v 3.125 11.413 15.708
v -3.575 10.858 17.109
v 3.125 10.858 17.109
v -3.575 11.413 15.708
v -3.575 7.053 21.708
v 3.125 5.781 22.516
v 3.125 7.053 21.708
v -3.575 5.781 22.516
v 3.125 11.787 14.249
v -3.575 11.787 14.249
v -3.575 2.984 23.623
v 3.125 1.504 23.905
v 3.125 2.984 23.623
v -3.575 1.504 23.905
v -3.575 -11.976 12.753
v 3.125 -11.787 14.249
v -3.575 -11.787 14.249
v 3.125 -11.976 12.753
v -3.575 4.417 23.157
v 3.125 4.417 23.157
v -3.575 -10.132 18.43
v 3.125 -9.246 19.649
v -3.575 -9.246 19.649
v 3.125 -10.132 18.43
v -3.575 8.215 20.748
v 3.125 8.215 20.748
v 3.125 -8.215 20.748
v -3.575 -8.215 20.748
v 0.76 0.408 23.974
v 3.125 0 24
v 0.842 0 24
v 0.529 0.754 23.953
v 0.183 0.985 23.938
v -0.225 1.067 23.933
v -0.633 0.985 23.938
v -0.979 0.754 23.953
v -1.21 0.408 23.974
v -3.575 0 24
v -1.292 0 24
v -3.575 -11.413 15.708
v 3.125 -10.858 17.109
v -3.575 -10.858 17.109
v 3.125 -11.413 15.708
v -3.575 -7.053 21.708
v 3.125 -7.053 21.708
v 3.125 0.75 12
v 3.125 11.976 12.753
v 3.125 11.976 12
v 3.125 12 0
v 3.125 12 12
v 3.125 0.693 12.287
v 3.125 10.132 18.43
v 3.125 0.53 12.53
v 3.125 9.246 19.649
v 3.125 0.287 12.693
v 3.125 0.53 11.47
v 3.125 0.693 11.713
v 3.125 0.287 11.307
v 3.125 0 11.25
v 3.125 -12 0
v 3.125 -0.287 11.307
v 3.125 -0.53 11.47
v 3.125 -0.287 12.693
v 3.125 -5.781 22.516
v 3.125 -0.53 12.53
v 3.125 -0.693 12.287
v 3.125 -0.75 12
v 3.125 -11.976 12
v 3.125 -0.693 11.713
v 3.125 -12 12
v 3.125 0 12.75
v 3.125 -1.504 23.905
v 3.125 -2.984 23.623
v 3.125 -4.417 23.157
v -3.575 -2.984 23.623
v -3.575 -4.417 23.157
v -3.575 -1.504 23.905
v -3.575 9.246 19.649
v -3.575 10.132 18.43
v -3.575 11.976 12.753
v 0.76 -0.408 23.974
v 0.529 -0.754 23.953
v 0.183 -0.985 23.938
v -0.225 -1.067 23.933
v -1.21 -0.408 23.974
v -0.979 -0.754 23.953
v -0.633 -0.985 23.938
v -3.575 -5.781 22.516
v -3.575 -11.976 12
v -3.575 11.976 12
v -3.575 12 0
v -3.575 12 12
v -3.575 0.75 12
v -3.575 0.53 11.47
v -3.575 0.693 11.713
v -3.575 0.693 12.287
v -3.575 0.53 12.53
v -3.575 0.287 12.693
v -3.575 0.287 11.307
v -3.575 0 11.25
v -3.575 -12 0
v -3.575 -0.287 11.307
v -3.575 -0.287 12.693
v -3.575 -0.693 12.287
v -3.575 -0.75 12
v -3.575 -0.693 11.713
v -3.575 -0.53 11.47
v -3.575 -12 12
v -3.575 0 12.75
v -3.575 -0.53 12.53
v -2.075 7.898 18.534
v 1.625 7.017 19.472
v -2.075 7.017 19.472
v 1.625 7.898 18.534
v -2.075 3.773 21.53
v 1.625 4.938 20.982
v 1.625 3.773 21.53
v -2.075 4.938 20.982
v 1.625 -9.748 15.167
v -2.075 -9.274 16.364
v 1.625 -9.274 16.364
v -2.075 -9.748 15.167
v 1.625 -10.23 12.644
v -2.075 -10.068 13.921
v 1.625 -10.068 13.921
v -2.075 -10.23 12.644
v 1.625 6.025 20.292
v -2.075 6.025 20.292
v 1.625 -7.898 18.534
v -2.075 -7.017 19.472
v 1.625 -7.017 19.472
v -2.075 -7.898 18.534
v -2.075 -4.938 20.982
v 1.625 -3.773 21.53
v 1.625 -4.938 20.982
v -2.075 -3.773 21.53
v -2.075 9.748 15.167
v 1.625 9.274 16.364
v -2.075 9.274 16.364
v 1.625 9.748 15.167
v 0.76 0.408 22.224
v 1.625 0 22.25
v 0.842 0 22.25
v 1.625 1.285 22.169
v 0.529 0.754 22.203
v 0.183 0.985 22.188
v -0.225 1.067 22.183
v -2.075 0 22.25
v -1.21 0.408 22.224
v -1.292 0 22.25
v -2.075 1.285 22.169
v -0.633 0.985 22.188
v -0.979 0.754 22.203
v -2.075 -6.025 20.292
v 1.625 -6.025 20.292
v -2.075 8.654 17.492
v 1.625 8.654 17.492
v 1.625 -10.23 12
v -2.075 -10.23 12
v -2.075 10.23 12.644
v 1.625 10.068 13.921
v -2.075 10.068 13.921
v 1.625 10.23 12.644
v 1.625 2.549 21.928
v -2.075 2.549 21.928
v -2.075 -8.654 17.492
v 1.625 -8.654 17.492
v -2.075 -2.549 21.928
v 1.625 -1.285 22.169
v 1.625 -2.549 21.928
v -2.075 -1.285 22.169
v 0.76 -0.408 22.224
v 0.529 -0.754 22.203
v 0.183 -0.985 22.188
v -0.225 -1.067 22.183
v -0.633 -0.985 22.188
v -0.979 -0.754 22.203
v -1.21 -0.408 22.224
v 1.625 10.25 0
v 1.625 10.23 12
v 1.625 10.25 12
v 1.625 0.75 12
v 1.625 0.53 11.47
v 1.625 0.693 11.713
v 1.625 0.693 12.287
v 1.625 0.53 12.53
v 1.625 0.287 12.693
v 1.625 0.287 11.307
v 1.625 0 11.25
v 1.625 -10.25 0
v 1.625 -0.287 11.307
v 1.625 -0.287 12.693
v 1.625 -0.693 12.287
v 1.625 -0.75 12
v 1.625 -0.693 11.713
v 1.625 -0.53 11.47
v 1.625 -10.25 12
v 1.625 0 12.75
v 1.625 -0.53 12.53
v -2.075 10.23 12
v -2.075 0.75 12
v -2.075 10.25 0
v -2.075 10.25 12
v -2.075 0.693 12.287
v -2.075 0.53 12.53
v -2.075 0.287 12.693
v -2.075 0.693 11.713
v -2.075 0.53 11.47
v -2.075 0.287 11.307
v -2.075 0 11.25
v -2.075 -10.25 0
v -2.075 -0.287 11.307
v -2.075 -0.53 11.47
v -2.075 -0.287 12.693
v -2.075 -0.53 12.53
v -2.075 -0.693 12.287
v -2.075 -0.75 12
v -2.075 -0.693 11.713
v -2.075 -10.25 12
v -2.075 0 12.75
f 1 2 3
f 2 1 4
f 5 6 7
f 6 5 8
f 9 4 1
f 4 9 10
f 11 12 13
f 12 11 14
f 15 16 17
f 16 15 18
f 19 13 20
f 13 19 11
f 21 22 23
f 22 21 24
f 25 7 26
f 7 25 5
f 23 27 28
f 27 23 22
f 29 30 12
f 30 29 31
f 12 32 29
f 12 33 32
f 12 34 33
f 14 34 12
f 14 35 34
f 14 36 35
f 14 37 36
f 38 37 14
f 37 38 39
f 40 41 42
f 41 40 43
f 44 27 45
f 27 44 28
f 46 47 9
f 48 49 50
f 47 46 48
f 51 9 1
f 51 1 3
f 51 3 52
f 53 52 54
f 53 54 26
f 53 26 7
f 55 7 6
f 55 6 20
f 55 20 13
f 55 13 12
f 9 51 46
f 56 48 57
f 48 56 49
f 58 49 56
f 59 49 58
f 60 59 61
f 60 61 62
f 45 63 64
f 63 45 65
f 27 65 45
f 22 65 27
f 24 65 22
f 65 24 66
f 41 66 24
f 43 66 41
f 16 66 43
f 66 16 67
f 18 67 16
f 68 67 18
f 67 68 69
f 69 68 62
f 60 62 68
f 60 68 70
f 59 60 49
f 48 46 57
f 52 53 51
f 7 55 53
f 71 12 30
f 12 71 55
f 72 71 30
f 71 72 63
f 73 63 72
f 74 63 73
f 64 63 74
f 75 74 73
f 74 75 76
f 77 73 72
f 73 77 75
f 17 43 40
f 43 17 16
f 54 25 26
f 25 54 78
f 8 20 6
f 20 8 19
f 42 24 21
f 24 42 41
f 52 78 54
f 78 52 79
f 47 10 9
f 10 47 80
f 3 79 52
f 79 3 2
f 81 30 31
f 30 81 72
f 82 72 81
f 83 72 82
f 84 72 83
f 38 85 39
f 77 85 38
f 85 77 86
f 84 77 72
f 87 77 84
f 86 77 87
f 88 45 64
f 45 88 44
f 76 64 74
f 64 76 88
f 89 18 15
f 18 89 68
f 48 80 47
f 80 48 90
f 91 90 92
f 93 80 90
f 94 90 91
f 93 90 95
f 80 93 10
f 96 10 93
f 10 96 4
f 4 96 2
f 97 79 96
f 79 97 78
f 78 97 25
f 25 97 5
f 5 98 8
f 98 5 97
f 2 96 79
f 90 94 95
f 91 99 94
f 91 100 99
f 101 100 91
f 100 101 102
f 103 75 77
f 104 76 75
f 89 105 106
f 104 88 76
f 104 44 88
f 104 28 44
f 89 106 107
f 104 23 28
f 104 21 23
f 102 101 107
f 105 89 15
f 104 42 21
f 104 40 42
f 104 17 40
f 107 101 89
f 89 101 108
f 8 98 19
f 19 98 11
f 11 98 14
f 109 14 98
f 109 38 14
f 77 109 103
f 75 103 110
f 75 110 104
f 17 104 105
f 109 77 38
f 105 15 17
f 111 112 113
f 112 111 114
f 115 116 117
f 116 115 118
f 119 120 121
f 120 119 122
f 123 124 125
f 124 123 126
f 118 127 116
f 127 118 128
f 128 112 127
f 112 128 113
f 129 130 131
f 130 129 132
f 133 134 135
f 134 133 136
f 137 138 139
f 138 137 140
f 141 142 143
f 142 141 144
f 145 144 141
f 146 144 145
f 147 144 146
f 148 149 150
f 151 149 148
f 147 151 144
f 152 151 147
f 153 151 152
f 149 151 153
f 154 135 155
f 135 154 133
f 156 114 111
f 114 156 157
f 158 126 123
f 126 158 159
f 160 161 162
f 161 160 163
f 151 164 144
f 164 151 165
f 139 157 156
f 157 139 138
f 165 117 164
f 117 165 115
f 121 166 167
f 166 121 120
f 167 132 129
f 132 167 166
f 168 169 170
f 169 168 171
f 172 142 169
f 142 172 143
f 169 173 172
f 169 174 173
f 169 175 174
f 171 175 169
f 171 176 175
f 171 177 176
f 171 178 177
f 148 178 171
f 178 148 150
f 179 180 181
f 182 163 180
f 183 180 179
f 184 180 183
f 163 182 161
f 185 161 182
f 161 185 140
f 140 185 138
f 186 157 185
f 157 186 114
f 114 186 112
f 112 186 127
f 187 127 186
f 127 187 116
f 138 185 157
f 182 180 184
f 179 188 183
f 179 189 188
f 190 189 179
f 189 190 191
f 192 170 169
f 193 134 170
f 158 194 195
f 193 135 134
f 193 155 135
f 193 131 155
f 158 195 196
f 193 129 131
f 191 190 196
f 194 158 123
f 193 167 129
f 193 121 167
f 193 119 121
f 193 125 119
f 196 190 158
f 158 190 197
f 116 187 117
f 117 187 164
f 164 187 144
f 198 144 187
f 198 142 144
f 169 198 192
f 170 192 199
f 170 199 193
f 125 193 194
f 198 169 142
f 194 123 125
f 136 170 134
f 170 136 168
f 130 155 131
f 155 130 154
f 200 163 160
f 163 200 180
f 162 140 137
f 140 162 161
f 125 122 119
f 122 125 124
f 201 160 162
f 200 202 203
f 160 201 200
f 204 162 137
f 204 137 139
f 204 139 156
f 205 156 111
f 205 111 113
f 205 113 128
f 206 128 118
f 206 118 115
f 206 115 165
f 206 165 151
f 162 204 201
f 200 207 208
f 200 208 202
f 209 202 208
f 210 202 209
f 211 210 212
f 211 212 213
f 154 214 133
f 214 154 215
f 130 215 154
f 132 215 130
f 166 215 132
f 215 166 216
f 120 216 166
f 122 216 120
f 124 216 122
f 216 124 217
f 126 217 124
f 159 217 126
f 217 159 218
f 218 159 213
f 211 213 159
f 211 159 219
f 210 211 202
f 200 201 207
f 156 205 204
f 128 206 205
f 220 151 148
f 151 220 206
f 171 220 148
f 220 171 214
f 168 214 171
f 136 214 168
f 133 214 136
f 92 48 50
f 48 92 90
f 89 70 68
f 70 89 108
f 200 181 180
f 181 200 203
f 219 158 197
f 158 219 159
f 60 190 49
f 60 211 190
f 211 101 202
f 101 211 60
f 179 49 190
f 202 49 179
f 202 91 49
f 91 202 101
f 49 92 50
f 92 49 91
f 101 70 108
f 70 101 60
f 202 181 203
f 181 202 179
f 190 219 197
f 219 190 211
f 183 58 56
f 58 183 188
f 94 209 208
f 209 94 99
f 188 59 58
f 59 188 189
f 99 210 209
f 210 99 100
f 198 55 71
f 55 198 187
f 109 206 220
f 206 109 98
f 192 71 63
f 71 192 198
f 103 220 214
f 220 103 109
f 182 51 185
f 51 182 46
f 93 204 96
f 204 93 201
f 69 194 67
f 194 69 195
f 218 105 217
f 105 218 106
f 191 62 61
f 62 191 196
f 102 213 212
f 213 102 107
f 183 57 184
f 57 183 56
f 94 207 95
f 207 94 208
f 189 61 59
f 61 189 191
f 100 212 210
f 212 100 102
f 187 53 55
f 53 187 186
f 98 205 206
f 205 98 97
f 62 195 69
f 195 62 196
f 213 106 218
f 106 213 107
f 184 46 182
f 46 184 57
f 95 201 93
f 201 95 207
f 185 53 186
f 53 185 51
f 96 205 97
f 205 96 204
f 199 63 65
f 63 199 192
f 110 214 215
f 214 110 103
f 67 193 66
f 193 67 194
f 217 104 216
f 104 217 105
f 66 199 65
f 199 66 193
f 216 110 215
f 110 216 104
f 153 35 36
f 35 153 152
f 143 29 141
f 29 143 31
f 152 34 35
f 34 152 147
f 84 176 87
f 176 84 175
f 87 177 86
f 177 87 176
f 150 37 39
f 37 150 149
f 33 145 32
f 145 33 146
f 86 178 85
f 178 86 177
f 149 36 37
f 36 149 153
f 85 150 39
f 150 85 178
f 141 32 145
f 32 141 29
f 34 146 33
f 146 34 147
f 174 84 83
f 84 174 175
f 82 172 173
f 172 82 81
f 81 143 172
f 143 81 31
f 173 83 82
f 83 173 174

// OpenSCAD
/*Battery dimensions in mm
CR1225 cell holder: 
 diameter=12mm 
 height=2.5mm 
 tolerance=0.5mm 
 wall thickness=2mm 

CR2032 cell holder: 
 diameter=20mm 
 height=3.2mm 
 tolerance=0.5mm 
 wall thickness=2mm 
*/

battery_diameter	=20.0;	// Diameter of battery
battery_height		=3.2;	// Thickness of battery
tolerance			=0.5;	// Make things a little looser
wall_thickness		=1.5;	// Wall thickness
wire_diameter		=1.5;	// Thickness of wire openings
extra_length		=2.0;	// Extends the open outwards to "hide" the battery a little bit
number_of_cells	=1;		// How many cells will be stacked

rotate([0,90,0])
{
	// Move to propper hieght and orientation
	translate([-battery_diameter/2-extra_length,0,-(battery_height*number_of_cells)-(wall_thickness/4)])
	{
		difference()
		{
			union()
			{
				difference()
				{
					// Main block
					cylinder(r=(battery_diameter/2)+tolerance+wall_thickness, h=battery_height*number_of_cells+(tolerance)+(2*wall_thickness),$fn=50);
					// Battery shape
					translate([0,0,wall_thickness])
						cylinder(r=(battery_diameter/2)+(tolerance/2), h=battery_height*number_of_cells+tolerance,$fn=50);
					// Square opening 
					translate([0,-((battery_diameter/2)+2+tolerance),0])
						cube([battery_diameter+10,battery_diameter*number_of_cells+5,battery_height*number_of_cells+5]);
				}
				difference()
				{
					// Square extension
					translate([0,-((battery_diameter/2)+wall_thickness+tolerance),0])
						cube([battery_diameter/2+extra_length,battery_diameter+(2*wall_thickness)+(2*tolerance),battery_height*number_of_cells+(2*wall_thickness)+tolerance]);
					// Square hole in end
					translate([0,-((battery_diameter/2))-(tolerance/2),wall_thickness])
						cube([battery_diameter+tolerance,battery_diameter+tolerance,battery_height*number_of_cells+tolerance]);
				}
			}
			// Wire holes
			translate([0,0,-1])
				cylinder(r=wire_diameter/2, h=battery_height*number_of_cells+tolerance+10,$fn=16);
			// Battery "push out" hole
			translate([-battery_diameter/2-wall_thickness-1,0,wall_thickness+(battery_height*number_of_cells/2)+tolerance/2])
				rotate([0,90,0])
					cylinder(r=battery_height/3,h=wall_thickness+1,$fn=16);
		}
	}
}
